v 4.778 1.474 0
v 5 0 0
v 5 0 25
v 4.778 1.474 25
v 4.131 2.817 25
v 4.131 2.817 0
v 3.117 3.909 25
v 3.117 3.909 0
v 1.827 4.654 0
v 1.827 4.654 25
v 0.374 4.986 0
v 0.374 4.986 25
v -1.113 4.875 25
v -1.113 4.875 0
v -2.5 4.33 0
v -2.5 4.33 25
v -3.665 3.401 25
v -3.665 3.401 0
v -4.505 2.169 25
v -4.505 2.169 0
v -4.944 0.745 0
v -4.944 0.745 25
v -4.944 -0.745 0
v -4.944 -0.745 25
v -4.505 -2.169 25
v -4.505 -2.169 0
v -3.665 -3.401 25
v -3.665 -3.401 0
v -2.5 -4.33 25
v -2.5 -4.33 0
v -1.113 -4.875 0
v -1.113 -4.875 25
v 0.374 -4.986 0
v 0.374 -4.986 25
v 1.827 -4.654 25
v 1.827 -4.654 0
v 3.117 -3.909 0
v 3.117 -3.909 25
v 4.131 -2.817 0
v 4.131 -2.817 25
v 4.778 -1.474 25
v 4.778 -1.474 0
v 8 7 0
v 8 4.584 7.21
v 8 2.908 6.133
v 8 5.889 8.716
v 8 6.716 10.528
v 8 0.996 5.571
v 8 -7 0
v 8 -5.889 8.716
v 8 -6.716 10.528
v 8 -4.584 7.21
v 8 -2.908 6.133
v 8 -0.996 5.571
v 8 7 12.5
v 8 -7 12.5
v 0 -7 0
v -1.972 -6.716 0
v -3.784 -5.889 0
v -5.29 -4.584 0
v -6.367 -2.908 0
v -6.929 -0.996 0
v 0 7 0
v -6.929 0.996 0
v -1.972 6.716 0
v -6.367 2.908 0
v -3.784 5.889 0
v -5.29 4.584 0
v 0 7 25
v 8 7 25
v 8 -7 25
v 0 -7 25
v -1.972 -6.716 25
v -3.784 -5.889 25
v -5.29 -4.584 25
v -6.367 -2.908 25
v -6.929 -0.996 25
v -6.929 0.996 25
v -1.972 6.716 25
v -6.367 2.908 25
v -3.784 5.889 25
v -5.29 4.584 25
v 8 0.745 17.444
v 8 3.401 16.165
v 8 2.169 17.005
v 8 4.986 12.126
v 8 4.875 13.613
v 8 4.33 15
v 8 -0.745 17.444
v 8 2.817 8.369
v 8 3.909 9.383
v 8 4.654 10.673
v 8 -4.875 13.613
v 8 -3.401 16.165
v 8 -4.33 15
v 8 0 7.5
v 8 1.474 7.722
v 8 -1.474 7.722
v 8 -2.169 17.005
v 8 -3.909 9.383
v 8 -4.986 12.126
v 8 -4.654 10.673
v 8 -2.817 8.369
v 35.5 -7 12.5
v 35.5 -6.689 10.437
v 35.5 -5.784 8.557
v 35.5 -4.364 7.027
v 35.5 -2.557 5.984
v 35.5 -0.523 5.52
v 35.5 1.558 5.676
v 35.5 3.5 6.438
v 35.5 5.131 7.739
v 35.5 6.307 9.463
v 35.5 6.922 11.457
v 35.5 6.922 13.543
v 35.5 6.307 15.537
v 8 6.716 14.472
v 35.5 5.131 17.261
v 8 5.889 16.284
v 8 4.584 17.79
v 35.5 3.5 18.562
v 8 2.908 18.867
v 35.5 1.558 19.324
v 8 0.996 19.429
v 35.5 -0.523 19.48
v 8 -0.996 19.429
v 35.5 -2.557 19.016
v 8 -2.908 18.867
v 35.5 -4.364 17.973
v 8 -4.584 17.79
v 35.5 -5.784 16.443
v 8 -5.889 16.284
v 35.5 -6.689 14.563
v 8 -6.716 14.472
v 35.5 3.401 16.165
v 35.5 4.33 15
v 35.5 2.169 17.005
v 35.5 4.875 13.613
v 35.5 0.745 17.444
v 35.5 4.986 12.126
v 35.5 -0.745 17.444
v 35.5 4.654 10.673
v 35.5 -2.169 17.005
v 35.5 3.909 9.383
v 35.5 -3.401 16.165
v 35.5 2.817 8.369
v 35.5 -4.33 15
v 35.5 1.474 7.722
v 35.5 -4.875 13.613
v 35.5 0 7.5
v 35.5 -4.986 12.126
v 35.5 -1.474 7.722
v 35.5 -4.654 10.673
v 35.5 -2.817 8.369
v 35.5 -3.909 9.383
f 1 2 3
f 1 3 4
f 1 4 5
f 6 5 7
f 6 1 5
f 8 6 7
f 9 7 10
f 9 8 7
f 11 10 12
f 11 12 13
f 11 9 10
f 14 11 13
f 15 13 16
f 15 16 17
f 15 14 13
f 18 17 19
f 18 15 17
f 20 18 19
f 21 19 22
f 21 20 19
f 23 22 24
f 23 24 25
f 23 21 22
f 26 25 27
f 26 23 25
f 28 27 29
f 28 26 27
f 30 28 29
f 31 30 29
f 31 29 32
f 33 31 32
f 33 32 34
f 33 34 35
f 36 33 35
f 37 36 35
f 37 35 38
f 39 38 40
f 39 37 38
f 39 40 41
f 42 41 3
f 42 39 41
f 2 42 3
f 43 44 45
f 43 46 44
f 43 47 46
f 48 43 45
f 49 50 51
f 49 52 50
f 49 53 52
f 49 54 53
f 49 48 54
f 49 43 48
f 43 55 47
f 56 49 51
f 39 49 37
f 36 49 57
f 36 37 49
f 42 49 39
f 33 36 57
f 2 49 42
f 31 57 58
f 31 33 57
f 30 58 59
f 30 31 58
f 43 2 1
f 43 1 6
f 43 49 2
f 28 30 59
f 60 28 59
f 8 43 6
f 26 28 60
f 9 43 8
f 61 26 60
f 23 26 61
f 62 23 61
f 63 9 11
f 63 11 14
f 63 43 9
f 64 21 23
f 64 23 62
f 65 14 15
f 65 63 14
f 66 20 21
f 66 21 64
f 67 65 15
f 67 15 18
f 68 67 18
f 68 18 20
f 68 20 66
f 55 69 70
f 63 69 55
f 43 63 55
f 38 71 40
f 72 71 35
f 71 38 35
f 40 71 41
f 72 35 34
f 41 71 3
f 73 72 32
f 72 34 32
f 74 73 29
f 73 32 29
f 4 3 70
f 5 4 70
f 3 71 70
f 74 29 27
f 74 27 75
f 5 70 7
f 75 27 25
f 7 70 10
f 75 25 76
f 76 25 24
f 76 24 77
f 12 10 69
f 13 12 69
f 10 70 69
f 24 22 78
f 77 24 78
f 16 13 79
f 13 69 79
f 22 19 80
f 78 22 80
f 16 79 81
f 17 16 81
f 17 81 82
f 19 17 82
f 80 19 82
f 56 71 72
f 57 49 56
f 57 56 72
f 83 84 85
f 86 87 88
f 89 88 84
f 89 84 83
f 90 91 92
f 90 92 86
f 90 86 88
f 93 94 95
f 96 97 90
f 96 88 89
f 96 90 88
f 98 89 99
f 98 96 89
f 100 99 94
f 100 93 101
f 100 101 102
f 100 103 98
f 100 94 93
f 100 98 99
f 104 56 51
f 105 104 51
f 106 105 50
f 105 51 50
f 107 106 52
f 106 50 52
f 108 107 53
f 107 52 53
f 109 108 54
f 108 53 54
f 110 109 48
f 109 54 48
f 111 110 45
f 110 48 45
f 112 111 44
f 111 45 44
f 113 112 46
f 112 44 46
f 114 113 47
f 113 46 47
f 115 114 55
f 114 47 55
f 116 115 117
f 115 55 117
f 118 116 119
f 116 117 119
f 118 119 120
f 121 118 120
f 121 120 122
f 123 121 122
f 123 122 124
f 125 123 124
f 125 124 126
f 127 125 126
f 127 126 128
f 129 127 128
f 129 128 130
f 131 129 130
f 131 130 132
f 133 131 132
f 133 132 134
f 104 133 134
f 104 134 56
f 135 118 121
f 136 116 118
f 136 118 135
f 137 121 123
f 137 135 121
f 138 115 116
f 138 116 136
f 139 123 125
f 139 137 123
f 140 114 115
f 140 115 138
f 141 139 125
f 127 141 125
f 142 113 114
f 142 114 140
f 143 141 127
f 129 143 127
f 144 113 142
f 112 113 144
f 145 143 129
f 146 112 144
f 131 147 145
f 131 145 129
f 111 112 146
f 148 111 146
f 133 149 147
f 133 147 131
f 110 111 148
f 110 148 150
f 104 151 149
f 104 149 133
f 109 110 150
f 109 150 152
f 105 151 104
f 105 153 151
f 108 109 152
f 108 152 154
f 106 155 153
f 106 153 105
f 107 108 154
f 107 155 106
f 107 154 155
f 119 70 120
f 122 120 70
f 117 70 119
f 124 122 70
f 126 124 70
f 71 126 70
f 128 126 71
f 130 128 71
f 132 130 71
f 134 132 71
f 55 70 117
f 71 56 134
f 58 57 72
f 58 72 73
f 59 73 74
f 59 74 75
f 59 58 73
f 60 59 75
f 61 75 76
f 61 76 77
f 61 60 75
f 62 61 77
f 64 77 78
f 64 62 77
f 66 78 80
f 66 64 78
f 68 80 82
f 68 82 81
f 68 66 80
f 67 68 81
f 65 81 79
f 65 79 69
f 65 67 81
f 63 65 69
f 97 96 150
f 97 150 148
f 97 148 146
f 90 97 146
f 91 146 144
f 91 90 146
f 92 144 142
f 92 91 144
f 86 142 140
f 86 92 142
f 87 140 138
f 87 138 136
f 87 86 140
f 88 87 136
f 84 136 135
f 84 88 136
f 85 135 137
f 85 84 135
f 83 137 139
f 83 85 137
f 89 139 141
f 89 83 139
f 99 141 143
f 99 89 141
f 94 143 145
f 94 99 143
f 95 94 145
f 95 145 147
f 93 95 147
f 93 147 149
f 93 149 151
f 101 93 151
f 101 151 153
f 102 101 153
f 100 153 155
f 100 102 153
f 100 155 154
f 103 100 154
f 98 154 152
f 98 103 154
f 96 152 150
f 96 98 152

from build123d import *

# Parameters (mm, degrees)
SZKIC1_R                    = 5
DODANIE_WYCI_GNI_CIE1_DEPTH = 25
SZKIC2_R                    = 7
SZKIC2_R_2                  = 5
DODANIE_WYCI_GNI_CIE2_DEPTH = 27.5


with BuildPart() as part:
    # Szkic1 → Dodanie-wyciągnięcie1 (new body)
    with BuildSketch(Plane.XY):
        with BuildLine():
            Line((0, 7), (8, 7))
            Line((8, 7), (8, -7))
            Line((8, -7), (0, -7))
            ThreePointArc((0, -7), (-7, 0), (0, 7))
        make_face()
        Circle(SZKIC1_R, mode=Mode.SUBTRACT)
    extrude(amount=DODANIE_WYCI_GNI_CIE1_DEPTH)

    # Szkic2 → Dodanie-wyciągnięcie2 (add)
    with BuildSketch(Plane(origin=(8, 0, 0), x_dir=(0, 0, -1), z_dir=(1, 0, 0))):
        with Locations(Location((-12.5, 0, 0), (0, 0, 270))):
            Circle(SZKIC2_R)
        with Locations((-12.5, 0)):
            Circle(SZKIC2_R_2, mode=Mode.SUBTRACT)
    extrude(amount=DODANIE_WYCI_GNI_CIE2_DEPTH)


solid = part.part
